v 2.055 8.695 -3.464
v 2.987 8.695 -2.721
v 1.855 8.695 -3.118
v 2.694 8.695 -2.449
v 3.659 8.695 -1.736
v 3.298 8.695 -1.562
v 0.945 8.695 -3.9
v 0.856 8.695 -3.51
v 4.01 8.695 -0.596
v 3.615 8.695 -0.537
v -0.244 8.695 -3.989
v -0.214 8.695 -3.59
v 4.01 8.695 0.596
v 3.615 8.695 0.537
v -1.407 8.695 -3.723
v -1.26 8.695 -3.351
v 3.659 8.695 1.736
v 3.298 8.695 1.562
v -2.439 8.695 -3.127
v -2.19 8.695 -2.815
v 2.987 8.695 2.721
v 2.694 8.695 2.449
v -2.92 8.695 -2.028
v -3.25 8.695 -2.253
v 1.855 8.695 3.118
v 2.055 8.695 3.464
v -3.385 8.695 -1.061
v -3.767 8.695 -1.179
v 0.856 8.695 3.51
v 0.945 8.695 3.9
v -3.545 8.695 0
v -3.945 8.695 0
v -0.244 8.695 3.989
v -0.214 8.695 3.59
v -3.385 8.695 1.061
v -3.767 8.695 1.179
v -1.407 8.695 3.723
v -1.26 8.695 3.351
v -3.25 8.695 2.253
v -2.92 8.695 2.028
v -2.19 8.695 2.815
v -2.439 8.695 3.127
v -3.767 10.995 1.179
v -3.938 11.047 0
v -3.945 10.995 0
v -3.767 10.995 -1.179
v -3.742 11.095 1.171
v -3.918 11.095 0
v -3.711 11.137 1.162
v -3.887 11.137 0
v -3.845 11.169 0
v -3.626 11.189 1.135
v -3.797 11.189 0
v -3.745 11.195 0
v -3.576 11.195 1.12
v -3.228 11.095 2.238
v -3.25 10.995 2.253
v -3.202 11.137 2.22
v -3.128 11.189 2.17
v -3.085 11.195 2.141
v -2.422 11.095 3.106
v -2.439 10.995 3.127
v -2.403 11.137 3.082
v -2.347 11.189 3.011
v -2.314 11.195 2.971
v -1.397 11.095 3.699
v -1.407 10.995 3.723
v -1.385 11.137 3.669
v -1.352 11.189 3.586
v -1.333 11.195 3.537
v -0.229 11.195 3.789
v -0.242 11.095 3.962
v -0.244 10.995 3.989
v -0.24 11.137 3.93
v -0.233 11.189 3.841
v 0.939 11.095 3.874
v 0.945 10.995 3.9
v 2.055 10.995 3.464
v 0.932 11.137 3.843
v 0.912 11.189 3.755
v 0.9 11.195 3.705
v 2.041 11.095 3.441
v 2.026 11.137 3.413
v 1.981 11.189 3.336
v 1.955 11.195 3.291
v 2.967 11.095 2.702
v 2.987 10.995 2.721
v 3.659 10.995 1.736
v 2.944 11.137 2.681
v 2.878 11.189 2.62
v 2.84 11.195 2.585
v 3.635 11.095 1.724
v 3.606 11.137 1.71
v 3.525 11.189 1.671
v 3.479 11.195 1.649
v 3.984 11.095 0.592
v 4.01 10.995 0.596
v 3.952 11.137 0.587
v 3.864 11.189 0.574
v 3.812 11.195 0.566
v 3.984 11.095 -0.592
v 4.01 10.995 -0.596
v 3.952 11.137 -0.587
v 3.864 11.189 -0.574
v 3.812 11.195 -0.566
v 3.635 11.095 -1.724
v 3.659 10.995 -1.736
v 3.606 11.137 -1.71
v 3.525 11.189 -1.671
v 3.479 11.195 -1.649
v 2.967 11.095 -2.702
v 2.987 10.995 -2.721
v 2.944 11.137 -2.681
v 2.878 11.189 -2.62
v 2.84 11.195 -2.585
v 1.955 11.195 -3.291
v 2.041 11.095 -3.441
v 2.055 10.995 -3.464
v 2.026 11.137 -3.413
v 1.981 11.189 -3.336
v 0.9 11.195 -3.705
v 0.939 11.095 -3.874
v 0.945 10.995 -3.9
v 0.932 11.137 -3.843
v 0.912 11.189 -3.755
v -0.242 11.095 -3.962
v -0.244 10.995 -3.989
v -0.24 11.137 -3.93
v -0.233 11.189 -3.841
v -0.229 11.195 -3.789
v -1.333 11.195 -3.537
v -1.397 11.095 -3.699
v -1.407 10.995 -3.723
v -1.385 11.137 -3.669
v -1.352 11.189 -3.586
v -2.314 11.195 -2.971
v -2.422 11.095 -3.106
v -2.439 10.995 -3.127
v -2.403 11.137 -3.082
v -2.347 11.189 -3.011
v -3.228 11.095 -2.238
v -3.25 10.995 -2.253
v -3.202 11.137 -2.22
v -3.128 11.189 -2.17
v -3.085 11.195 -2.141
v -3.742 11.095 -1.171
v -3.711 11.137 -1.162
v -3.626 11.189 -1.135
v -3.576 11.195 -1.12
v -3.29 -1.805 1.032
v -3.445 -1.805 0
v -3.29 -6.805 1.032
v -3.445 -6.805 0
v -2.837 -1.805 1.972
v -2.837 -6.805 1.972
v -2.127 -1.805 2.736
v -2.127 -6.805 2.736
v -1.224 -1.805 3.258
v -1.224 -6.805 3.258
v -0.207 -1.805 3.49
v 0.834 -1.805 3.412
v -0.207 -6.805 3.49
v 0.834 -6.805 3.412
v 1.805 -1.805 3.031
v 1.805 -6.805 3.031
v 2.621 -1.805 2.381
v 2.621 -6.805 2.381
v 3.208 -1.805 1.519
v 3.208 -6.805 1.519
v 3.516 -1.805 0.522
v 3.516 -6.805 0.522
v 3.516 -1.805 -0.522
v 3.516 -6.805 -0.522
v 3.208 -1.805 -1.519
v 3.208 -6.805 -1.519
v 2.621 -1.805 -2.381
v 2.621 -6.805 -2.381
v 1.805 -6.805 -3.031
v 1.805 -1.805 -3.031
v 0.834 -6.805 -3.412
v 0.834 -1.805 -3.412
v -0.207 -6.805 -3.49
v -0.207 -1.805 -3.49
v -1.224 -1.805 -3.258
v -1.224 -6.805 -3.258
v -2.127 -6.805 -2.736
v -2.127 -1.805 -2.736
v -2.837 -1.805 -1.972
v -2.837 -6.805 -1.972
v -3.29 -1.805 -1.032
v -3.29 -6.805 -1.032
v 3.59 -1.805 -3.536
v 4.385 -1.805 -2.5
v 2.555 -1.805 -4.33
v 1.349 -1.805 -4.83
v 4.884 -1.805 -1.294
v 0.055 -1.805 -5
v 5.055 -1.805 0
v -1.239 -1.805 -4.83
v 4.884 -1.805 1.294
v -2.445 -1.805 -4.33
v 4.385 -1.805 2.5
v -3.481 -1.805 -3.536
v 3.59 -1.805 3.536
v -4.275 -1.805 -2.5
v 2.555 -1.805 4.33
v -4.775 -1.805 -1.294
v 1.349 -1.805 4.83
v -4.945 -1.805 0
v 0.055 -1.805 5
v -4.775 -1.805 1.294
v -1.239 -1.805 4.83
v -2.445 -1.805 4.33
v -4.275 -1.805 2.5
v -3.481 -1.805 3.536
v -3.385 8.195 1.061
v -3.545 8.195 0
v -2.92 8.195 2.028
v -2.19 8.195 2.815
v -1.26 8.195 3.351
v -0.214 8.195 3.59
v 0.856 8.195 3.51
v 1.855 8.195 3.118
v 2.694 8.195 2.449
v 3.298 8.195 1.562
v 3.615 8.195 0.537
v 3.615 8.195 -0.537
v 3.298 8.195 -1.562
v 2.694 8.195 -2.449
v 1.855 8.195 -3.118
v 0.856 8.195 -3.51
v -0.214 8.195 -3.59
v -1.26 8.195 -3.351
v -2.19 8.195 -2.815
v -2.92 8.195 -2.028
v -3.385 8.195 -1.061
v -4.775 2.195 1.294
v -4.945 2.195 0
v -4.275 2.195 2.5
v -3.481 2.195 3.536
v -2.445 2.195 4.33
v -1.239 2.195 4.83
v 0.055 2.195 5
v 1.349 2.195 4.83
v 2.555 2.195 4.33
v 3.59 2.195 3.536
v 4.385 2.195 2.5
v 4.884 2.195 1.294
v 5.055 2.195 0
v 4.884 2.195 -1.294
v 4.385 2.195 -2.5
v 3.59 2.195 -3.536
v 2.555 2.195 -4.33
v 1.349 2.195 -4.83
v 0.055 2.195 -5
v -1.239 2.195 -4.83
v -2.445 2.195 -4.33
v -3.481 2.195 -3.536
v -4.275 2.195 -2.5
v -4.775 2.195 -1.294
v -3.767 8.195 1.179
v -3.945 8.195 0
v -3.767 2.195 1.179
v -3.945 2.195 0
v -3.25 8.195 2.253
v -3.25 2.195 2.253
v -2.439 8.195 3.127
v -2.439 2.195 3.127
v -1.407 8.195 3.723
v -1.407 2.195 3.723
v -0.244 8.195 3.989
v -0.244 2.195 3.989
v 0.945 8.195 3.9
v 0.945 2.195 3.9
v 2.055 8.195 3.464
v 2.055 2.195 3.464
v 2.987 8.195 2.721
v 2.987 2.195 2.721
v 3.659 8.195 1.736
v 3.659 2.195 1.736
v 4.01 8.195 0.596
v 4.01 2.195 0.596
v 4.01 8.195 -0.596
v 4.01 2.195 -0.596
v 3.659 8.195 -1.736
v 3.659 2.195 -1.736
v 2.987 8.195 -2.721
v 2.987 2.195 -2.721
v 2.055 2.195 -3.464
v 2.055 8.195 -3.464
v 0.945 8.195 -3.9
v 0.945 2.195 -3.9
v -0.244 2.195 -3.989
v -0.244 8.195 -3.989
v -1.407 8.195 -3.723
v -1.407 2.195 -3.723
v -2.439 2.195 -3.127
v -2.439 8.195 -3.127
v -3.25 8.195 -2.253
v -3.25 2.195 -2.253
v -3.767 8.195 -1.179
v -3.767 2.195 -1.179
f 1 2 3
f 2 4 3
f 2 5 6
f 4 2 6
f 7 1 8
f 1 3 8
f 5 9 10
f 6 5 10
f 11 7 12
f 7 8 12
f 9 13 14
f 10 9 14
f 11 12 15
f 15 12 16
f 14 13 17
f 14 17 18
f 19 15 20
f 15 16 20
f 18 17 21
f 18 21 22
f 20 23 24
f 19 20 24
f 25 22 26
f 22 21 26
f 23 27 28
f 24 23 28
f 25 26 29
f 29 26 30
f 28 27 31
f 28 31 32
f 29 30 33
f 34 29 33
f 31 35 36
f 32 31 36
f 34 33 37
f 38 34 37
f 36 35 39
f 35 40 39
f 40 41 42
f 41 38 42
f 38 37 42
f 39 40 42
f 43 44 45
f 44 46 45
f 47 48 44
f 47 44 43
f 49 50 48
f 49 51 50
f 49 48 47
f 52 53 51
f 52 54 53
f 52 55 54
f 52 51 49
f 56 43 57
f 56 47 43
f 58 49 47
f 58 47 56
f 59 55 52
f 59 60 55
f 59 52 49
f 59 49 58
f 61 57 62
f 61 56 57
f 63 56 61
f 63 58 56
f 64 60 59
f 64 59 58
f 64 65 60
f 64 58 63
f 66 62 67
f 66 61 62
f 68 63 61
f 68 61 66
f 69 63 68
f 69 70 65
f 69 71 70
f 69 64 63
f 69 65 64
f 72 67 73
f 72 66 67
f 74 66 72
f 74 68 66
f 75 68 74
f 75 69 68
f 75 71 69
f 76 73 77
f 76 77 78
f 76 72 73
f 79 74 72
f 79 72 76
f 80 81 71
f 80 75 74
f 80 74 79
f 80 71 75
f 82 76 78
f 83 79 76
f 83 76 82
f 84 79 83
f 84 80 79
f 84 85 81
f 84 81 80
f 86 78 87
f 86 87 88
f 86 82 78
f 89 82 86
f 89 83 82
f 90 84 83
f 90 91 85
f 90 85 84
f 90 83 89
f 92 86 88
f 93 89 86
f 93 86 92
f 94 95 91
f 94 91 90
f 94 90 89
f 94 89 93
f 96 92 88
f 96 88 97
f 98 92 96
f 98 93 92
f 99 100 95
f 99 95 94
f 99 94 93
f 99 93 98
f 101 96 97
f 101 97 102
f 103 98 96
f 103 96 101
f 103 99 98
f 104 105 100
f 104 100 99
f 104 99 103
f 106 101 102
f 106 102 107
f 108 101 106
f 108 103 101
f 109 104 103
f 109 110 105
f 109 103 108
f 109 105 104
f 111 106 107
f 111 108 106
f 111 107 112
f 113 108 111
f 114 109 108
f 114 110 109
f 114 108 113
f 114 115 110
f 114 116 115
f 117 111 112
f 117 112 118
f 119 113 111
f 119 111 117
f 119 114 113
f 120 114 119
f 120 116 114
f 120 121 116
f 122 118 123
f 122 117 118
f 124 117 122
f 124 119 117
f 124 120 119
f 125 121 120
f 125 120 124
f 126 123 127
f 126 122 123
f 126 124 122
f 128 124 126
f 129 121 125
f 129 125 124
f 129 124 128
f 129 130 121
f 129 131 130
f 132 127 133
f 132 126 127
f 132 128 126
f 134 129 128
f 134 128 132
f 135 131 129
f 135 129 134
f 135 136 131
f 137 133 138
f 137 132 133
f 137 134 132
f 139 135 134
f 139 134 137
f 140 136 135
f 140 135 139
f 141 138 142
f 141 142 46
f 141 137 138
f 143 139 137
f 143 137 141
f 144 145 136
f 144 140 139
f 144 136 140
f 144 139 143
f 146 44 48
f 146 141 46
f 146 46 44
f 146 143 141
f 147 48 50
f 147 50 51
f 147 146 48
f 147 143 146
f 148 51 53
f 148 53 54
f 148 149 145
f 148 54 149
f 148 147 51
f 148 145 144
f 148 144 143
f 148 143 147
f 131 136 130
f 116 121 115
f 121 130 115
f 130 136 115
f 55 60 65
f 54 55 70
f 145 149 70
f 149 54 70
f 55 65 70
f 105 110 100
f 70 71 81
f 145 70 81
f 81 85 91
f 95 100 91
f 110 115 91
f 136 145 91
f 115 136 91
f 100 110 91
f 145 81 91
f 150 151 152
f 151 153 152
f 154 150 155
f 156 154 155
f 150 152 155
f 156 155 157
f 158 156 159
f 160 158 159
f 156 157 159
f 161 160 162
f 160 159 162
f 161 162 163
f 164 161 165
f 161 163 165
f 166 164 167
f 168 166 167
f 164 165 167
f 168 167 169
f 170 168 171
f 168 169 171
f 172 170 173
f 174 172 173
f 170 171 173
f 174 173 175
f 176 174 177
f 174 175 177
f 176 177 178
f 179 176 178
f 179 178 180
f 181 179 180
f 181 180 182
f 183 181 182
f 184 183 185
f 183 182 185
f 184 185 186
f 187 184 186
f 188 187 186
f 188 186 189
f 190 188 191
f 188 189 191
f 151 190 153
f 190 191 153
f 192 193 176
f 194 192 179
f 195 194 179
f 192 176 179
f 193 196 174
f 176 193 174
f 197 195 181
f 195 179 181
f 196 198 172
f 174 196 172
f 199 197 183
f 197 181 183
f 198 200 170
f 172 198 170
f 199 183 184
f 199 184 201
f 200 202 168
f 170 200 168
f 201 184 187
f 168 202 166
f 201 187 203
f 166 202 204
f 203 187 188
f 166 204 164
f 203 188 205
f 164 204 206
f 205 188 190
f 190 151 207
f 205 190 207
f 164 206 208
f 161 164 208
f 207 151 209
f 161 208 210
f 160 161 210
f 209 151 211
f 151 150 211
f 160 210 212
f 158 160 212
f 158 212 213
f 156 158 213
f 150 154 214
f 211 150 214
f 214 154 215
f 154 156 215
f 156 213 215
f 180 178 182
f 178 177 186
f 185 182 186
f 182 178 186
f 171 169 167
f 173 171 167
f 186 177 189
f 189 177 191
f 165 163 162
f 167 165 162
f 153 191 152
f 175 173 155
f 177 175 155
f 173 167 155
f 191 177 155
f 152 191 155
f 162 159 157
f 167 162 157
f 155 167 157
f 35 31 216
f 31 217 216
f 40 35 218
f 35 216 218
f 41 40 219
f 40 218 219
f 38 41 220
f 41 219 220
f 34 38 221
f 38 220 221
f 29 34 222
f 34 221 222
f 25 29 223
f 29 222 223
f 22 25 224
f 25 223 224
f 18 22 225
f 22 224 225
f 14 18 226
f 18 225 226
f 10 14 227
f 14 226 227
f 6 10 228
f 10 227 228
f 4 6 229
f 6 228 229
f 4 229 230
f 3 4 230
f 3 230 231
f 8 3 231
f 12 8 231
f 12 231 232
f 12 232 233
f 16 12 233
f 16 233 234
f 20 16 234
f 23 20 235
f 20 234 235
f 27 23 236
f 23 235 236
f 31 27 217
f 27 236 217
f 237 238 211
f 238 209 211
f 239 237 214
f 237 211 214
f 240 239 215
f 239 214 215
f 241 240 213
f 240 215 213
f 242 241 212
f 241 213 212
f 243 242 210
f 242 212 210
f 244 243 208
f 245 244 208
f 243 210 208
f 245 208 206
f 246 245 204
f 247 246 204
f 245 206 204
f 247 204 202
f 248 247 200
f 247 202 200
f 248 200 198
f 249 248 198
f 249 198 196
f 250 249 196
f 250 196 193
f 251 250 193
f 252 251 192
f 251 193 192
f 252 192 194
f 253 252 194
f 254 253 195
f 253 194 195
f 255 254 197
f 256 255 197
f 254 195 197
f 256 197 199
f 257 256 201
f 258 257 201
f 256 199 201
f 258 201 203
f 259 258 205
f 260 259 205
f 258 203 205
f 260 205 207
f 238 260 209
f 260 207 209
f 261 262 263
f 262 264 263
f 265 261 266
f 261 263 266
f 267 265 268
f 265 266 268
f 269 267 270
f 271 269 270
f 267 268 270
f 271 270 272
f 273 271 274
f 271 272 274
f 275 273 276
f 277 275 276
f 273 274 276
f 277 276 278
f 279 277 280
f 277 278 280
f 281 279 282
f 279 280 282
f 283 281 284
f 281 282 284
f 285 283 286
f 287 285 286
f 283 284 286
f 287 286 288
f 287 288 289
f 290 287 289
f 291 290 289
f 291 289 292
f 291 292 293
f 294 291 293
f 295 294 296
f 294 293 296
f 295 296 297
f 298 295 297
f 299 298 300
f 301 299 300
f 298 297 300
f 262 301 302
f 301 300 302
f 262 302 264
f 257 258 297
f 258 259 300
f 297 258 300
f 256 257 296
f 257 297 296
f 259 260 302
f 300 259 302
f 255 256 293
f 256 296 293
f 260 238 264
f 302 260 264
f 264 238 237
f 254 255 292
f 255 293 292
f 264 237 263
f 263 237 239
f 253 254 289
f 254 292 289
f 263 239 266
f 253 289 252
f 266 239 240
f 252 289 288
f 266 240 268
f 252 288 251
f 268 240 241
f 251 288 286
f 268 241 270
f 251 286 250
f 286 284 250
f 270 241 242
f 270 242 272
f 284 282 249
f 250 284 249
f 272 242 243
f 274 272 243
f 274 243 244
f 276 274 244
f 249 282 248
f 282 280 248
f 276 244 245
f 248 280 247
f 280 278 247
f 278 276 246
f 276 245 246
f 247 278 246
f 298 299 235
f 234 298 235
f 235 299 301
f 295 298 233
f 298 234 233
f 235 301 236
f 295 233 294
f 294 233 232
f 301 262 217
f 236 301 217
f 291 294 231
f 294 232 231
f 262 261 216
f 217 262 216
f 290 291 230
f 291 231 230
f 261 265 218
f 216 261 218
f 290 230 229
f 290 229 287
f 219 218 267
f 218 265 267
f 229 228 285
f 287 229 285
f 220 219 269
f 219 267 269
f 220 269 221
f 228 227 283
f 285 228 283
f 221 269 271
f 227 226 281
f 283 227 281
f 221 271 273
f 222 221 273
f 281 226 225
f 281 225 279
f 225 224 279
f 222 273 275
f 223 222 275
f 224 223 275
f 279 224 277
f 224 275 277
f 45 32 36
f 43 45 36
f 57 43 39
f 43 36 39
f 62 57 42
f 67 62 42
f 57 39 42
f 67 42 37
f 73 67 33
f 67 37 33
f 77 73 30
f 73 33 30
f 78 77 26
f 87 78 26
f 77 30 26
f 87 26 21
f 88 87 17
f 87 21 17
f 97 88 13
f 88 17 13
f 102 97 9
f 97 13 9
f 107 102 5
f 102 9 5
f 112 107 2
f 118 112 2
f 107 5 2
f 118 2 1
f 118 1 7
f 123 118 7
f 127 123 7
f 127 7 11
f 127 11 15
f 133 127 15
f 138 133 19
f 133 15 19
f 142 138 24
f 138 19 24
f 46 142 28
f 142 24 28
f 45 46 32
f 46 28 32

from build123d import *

# Parameters (mm, degrees)
FILLET1_R = 0.2


with BuildPart() as part:
    # Sketch2 → Revolve1 (revolve)
    with BuildSketch(Plane.XY):
        Polygon((-3.9451521, 11.195402299), (-3.9451521, 8.695402299), (-3.5451521, 8.695402299), (-3.5451521, 8.195402299), (-3.9451521, 8.195402299), (-3.9451521, 2.195402299), (-4.9451521, 2.195402299), (-4.9451521, -1.804597701), (-3.4451521, -1.804597701), (-3.4451521, -6.804597701), (0.0548479, -6.804597701), (0.0548479, 11.195402299), align=None)
    revolve(axis=Axis((0.0548479, -6.804597701, 0), (0, 1, 0)))

    # Fillet1
    fillet1_edges = [part.edges().sort_by_distance(p)[0] for p in [
        (4.0548479, 11.195402299, 0),
    ]]
    fillet(fillet1_edges, radius=FILLET1_R)


solid = part.part
